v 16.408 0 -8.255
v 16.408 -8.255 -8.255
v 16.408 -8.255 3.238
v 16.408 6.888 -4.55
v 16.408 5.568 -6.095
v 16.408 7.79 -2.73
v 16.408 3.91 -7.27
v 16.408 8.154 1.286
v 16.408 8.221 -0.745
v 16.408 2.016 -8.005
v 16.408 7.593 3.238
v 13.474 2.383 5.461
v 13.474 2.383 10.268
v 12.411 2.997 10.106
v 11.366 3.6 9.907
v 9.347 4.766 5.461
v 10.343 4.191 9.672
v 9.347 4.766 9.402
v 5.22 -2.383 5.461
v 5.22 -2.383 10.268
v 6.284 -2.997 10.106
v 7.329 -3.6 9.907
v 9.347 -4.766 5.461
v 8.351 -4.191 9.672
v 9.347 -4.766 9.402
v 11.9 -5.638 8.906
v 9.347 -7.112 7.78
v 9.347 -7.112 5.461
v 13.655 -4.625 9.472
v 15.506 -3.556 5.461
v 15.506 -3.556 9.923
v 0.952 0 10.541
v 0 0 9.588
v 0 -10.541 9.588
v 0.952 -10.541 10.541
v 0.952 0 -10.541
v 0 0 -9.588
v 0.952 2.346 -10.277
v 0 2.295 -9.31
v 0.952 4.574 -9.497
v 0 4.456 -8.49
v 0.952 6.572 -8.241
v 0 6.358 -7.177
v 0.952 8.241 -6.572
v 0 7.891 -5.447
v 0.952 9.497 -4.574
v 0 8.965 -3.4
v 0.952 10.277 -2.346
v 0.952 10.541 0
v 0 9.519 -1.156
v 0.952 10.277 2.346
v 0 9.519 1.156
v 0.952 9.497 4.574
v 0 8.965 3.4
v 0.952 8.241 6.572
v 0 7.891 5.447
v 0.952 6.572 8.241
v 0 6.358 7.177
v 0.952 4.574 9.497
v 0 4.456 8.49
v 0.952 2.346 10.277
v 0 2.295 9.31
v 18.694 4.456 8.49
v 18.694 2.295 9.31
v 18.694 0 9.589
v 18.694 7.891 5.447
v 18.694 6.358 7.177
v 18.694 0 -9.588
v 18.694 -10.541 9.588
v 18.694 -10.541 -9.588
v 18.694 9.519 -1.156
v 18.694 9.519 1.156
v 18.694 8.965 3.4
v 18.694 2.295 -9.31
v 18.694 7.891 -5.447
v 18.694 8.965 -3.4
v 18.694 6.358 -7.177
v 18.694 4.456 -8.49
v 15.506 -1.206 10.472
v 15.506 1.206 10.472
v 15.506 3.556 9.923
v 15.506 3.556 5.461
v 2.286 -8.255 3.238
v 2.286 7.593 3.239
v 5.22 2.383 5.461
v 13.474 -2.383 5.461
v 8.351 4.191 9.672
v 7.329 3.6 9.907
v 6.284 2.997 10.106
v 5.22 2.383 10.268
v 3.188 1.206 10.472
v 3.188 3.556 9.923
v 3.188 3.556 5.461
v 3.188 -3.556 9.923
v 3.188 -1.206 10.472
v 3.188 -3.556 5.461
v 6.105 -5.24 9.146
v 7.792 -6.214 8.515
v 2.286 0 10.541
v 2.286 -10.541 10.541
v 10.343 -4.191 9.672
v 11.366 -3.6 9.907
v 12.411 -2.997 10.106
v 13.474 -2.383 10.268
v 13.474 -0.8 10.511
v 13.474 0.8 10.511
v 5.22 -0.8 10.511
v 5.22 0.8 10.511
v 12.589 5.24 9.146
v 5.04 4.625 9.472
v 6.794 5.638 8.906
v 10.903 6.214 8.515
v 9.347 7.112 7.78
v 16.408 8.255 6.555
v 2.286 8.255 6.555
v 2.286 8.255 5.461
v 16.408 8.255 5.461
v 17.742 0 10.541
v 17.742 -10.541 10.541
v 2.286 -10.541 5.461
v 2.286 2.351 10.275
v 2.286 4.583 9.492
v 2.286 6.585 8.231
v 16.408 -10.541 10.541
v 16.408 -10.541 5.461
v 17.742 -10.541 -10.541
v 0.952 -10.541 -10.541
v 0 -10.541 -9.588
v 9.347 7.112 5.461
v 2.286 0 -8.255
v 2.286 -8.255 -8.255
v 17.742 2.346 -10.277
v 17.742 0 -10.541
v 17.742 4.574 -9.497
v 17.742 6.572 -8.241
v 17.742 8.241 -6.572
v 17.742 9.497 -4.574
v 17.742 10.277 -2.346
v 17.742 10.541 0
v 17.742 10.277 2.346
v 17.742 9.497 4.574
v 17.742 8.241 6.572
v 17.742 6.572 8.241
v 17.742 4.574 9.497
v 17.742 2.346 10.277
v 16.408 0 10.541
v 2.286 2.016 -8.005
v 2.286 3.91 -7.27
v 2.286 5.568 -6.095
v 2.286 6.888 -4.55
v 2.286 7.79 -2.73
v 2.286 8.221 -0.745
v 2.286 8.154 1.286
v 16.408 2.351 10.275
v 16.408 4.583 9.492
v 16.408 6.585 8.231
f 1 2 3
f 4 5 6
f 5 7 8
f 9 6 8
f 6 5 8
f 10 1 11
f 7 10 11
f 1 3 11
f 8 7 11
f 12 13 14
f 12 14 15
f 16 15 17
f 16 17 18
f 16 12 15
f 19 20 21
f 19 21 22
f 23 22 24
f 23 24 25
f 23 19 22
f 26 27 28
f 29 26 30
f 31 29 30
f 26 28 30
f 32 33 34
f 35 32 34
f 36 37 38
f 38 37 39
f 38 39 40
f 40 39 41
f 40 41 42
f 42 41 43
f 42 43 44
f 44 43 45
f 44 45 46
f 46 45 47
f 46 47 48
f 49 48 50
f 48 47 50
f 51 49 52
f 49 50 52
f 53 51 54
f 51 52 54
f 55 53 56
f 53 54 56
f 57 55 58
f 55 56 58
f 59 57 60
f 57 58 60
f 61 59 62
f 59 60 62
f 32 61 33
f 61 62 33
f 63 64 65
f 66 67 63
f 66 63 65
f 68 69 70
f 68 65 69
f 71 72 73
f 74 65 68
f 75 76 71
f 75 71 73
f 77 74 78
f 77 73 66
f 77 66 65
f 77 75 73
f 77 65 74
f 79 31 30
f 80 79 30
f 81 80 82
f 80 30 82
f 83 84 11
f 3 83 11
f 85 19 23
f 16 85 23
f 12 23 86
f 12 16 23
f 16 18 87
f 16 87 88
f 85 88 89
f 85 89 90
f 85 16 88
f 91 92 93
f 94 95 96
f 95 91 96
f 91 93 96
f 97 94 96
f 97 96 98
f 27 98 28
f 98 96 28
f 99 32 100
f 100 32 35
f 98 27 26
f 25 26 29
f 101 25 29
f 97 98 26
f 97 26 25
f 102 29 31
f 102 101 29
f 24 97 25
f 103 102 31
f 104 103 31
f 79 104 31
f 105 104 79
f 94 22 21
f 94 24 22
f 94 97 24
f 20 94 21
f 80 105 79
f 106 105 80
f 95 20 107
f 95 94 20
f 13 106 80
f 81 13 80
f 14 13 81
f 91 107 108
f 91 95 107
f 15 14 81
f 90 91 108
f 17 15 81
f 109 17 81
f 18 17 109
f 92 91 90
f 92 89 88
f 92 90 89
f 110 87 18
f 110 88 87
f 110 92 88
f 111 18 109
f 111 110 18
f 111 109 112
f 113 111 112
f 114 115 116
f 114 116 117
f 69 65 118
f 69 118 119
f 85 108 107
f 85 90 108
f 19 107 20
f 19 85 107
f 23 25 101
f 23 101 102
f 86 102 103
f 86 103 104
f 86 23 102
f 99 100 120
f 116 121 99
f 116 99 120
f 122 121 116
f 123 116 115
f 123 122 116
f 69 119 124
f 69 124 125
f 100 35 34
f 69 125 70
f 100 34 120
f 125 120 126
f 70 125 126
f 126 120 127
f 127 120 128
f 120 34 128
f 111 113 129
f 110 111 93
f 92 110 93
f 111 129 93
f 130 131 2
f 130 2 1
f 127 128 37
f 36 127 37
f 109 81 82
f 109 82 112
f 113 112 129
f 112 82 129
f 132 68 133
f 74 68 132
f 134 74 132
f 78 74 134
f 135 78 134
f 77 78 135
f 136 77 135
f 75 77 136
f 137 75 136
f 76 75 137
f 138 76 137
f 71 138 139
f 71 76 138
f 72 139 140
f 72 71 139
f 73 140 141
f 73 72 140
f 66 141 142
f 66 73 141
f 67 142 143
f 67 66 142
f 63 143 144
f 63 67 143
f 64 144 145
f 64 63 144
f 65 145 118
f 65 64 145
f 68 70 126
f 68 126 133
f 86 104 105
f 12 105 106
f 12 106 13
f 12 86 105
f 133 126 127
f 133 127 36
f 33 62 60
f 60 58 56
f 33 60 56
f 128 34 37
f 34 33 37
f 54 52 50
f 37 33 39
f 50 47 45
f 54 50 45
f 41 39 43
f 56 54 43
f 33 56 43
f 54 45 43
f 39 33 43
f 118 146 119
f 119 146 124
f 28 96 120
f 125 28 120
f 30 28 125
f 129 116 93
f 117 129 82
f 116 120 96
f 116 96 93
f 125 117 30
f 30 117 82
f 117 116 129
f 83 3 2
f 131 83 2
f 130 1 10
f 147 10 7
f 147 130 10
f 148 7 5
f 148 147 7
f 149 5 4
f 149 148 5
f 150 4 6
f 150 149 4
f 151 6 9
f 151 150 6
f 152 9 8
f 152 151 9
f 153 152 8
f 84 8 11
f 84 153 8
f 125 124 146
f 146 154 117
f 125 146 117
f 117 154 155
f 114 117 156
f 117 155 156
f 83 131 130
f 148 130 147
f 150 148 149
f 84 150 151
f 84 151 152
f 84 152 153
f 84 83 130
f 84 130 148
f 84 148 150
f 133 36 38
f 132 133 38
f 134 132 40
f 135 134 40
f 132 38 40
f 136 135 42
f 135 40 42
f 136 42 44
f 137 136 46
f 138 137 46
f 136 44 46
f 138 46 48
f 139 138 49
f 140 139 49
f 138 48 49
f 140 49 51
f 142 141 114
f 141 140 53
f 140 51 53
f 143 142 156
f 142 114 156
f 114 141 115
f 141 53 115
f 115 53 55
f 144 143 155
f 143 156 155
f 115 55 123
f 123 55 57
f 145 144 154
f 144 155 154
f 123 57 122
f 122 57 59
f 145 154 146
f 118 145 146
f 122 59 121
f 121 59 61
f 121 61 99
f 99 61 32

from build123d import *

# Parameters (mm, degrees)
BOSS_EXTRUDE1_DEPTH      = 18.6944
CHAMFER1_SIZE            = 0.9525
SKETCH2_W                = 14.1224
SKETCH2_H                = 18.796
CUT_EXTRUDE1_DEPTH       = 6.35
SHELL2_START             = 2.286
SHELL2_DEPTH             = 14.1224
BOSS_EXTRUDE3_REACH      = 28.031
BOSS_EXTRUDE3_END_RADIUS = 10.541
BOSS_EXTRUDE4_DEPTH      = 1.27
BOSS_EXTRUDE4_DEPTH_BACK = 0.9525
SKETCH4_W                = 14.473113765
SKETCH4_H                = 19.407327032


# Read off the part's stored shape, not the designer's step: Shell2
with BuildPart() as part:
    # Sketch1 → Boss-Extrude1 (new body)
    with BuildSketch(Plane(origin=(0, 0, 0), x_dir=(0, 0, -1), z_dir=(1, 0, 0))):
        with BuildLine():
            Line((-10.541, 0), (-10.541, -10.541))
            Line((-10.541, -10.541), (10.541, -10.541))
            Line((10.541, -10.541), (10.541, 0))
            ThreePointArc((10.541, 0), (0, 10.541), (-10.541, 0))
        make_face()
    extrude(amount=BOSS_EXTRUDE1_DEPTH)

    # Chamfer1
    chamfer1_edges = [part.edges().sort_by_distance(p)[0] for p in [
        (18.6944, -5.2705, 10.541),
        (18.6944, -5.2705, -10.541),
        (0, -5.2705, 10.541),
        (0, 10.541, 0),
        (0, -5.2705, -10.541),
        (18.6944, 10.541, 0),
    ]]
    chamfer(chamfer1_edges, length=CHAMFER1_SIZE)

    # Sketch2 → Cut-Extrude1 (cut)
    with BuildSketch(Plane.XY.offset(10.541)):
        with Locations((9.3472, -1.143)):
            Rectangle(SKETCH2_W, SKETCH2_H)
    extrude(amount=-CUT_EXTRUDE1_DEPTH, mode=Mode.SUBTRACT)

    # Shell2 outline → Shell2 (cut)
    with BuildSketch(Plane.YZ.offset(SHELL2_START)):
        with BuildLine():
            ThreePointArc((0, -8.255), (7.167347138, -4.095626936), (7.112, 4.191))
            Line((7.112, 4.191), (-8.255, 4.191))
            Line((-8.255, 4.191), (-8.255, -8.255))
            Line((-8.255, -8.255), (0, -8.255))
        make_face()
    extrude(amount=SHELL2_DEPTH, mode=Mode.SUBTRACT)



with BuildPart() as body_2:
    # Boss-Extrude3: up to this cylinder (the profile starts inside it)
    boss_extrude3_end = Plane(origin=(6.361697, 0, 0), z_dir=(-1, 0, 0)) * Cylinder(BOSS_EXTRUDE3_END_RADIUS, 78.144, mode=Mode.PRIVATE)
    # Sketch3 → Boss-Extrude3 (new, up to the surface)
    with BuildSketch(Plane.XY.offset(4.191), mode=Mode.PRIVATE) as boss_extrude3_sk1:
        Polygon((9.3472, 7.112), (3.188027328, 3.556), (3.188027328, -3.556), (9.3472, -7.112), (15.506372672, -3.556), (15.506372672, 3.556), align=None)
        Polygon((9.3472, 4.765648506), (5.220027328, 2.382824253), (5.220027328, -2.382824253), (9.3472, -4.765648506), (13.474372672, -2.382824253), (13.474372672, 2.382824253), align=None, mode=Mode.SUBTRACT)
    boss_extrude3_tool1 = extrude(boss_extrude3_sk1.sketch, amount=BOSS_EXTRUDE3_REACH, mode=Mode.PRIVATE) & boss_extrude3_end
    add(boss_extrude3_tool1.solids().sort_by_distance((6.361697, 5.171044, 4.191))[0])


with BuildPart() as part_1:
    add(part.part)

    add(body_2.part)  # Boss-Extrude4 merges body 2
    # Sketch4 → Boss-Extrude4 (add, two sides: drawn at the far end of the back side and taken through both)
    with BuildSketch(Plane.XY.offset(4.191).offset(-BOSS_EXTRUDE4_DEPTH_BACK)):
        with Locations((9.522556883, -0.837336484)):
            Rectangle(SKETCH4_W, SKETCH4_H)
    extrude(amount=BOSS_EXTRUDE4_DEPTH + BOSS_EXTRUDE4_DEPTH_BACK)


solid = part_1.part
